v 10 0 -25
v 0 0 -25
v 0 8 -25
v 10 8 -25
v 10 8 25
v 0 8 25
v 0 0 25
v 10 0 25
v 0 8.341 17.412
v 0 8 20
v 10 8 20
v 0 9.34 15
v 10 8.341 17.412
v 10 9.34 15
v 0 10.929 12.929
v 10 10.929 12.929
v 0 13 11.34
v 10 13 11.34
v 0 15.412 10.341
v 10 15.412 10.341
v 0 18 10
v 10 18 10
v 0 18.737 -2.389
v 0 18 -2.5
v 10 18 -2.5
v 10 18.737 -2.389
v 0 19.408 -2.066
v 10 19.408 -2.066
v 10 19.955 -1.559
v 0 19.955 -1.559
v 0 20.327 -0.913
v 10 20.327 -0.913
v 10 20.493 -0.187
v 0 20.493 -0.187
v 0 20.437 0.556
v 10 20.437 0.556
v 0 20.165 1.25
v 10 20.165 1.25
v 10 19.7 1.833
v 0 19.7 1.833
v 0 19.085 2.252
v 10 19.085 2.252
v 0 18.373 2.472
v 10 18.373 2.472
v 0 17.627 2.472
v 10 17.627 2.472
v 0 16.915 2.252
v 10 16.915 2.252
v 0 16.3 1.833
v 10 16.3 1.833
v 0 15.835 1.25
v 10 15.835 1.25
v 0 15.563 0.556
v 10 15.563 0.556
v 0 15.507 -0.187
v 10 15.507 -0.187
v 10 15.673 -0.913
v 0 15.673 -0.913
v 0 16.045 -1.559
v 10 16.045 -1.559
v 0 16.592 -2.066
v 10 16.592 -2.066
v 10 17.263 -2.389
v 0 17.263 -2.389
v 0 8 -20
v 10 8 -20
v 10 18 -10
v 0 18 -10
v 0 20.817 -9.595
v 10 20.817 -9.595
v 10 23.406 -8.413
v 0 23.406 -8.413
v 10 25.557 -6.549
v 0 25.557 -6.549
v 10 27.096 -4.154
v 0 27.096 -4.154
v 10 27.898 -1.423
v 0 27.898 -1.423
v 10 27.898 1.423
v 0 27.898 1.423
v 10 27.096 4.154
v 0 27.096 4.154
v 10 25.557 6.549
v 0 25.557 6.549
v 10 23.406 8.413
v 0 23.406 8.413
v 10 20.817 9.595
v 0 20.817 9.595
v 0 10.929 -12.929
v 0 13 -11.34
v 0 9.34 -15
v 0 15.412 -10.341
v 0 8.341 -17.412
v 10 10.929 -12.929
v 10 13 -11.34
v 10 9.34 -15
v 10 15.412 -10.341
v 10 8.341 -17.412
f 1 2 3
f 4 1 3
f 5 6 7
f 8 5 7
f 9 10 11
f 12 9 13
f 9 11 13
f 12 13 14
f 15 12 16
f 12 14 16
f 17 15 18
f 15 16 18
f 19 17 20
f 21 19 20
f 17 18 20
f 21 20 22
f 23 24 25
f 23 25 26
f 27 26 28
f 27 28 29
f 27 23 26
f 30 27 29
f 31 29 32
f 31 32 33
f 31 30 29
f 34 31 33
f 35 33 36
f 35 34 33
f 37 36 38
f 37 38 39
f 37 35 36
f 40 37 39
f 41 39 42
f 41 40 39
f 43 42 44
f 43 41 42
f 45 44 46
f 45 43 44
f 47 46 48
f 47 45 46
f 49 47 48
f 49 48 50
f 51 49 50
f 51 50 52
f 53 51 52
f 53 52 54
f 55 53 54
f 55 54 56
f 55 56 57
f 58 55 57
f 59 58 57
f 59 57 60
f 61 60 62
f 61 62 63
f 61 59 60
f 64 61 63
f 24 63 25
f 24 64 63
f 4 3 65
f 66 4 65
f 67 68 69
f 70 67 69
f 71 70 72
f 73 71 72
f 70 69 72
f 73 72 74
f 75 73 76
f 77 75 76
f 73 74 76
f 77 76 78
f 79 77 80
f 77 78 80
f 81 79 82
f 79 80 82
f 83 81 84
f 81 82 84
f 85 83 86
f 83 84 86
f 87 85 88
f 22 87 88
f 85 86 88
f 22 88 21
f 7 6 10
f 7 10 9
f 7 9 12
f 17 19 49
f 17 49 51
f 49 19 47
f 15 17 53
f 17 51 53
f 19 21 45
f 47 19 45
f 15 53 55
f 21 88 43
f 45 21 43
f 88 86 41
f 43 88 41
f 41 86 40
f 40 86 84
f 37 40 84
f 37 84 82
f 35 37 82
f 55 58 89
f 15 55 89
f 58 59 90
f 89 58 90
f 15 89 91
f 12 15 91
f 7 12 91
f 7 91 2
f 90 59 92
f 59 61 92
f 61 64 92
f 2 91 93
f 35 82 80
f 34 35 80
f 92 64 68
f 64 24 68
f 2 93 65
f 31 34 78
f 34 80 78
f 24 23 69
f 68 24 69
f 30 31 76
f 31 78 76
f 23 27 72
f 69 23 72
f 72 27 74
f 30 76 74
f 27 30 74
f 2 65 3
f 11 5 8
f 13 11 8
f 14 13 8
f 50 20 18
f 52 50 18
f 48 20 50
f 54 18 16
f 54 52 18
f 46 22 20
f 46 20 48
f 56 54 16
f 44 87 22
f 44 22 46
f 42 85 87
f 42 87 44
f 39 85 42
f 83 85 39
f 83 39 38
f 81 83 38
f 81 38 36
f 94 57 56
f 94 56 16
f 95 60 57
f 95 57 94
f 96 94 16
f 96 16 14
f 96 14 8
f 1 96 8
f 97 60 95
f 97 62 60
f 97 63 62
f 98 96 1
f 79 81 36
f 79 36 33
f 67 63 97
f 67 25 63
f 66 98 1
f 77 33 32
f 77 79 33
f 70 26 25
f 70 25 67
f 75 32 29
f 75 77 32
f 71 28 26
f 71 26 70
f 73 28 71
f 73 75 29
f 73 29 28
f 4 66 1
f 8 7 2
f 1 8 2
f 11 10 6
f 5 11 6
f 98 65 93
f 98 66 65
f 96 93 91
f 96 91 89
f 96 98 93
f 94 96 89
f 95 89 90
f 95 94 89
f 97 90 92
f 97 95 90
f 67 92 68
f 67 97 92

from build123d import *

# Parameters (mm, degrees)
SKETCH_1_R      = 2.5
EXTRUDE_1_DEPTH = 10
FILLET_1_R      = 10


with BuildPart() as part:
    # 草圖1 → 填料-伸長1 (new body)
    with BuildSketch(Plane(origin=(0, 0, 0), x_dir=(0, 0, -1), z_dir=(1, 0, 0))):
        with BuildLine():
            Line((-25, 0), (25, 0))
            Line((25, 0), (25, 8))
            Line((25, 8), (10, 8))
            Line((10, 8), (10, 18))
            ThreePointArc((10, 18), (0, 28), (-10, 18))
            Line((-10, 18), (-10, 8))
            Line((-10, 8), (-25, 8))
            Line((-25, 8), (-25, 0))
        make_face()
        with Locations((0, 18)):
            Circle(SKETCH_1_R, mode=Mode.SUBTRACT)
    extrude(amount=EXTRUDE_1_DEPTH)

    # 圓角1
    fillet_1_edges = [part.edges().sort_by_distance(p)[0] for p in [
        (5, 8, -10),
        (5, 8, 10),
    ]]
    fillet(fillet_1_edges, radius=FILLET_1_R - 0.0001)  # a hair under: the kernel refuses the full size


solid = part.part
